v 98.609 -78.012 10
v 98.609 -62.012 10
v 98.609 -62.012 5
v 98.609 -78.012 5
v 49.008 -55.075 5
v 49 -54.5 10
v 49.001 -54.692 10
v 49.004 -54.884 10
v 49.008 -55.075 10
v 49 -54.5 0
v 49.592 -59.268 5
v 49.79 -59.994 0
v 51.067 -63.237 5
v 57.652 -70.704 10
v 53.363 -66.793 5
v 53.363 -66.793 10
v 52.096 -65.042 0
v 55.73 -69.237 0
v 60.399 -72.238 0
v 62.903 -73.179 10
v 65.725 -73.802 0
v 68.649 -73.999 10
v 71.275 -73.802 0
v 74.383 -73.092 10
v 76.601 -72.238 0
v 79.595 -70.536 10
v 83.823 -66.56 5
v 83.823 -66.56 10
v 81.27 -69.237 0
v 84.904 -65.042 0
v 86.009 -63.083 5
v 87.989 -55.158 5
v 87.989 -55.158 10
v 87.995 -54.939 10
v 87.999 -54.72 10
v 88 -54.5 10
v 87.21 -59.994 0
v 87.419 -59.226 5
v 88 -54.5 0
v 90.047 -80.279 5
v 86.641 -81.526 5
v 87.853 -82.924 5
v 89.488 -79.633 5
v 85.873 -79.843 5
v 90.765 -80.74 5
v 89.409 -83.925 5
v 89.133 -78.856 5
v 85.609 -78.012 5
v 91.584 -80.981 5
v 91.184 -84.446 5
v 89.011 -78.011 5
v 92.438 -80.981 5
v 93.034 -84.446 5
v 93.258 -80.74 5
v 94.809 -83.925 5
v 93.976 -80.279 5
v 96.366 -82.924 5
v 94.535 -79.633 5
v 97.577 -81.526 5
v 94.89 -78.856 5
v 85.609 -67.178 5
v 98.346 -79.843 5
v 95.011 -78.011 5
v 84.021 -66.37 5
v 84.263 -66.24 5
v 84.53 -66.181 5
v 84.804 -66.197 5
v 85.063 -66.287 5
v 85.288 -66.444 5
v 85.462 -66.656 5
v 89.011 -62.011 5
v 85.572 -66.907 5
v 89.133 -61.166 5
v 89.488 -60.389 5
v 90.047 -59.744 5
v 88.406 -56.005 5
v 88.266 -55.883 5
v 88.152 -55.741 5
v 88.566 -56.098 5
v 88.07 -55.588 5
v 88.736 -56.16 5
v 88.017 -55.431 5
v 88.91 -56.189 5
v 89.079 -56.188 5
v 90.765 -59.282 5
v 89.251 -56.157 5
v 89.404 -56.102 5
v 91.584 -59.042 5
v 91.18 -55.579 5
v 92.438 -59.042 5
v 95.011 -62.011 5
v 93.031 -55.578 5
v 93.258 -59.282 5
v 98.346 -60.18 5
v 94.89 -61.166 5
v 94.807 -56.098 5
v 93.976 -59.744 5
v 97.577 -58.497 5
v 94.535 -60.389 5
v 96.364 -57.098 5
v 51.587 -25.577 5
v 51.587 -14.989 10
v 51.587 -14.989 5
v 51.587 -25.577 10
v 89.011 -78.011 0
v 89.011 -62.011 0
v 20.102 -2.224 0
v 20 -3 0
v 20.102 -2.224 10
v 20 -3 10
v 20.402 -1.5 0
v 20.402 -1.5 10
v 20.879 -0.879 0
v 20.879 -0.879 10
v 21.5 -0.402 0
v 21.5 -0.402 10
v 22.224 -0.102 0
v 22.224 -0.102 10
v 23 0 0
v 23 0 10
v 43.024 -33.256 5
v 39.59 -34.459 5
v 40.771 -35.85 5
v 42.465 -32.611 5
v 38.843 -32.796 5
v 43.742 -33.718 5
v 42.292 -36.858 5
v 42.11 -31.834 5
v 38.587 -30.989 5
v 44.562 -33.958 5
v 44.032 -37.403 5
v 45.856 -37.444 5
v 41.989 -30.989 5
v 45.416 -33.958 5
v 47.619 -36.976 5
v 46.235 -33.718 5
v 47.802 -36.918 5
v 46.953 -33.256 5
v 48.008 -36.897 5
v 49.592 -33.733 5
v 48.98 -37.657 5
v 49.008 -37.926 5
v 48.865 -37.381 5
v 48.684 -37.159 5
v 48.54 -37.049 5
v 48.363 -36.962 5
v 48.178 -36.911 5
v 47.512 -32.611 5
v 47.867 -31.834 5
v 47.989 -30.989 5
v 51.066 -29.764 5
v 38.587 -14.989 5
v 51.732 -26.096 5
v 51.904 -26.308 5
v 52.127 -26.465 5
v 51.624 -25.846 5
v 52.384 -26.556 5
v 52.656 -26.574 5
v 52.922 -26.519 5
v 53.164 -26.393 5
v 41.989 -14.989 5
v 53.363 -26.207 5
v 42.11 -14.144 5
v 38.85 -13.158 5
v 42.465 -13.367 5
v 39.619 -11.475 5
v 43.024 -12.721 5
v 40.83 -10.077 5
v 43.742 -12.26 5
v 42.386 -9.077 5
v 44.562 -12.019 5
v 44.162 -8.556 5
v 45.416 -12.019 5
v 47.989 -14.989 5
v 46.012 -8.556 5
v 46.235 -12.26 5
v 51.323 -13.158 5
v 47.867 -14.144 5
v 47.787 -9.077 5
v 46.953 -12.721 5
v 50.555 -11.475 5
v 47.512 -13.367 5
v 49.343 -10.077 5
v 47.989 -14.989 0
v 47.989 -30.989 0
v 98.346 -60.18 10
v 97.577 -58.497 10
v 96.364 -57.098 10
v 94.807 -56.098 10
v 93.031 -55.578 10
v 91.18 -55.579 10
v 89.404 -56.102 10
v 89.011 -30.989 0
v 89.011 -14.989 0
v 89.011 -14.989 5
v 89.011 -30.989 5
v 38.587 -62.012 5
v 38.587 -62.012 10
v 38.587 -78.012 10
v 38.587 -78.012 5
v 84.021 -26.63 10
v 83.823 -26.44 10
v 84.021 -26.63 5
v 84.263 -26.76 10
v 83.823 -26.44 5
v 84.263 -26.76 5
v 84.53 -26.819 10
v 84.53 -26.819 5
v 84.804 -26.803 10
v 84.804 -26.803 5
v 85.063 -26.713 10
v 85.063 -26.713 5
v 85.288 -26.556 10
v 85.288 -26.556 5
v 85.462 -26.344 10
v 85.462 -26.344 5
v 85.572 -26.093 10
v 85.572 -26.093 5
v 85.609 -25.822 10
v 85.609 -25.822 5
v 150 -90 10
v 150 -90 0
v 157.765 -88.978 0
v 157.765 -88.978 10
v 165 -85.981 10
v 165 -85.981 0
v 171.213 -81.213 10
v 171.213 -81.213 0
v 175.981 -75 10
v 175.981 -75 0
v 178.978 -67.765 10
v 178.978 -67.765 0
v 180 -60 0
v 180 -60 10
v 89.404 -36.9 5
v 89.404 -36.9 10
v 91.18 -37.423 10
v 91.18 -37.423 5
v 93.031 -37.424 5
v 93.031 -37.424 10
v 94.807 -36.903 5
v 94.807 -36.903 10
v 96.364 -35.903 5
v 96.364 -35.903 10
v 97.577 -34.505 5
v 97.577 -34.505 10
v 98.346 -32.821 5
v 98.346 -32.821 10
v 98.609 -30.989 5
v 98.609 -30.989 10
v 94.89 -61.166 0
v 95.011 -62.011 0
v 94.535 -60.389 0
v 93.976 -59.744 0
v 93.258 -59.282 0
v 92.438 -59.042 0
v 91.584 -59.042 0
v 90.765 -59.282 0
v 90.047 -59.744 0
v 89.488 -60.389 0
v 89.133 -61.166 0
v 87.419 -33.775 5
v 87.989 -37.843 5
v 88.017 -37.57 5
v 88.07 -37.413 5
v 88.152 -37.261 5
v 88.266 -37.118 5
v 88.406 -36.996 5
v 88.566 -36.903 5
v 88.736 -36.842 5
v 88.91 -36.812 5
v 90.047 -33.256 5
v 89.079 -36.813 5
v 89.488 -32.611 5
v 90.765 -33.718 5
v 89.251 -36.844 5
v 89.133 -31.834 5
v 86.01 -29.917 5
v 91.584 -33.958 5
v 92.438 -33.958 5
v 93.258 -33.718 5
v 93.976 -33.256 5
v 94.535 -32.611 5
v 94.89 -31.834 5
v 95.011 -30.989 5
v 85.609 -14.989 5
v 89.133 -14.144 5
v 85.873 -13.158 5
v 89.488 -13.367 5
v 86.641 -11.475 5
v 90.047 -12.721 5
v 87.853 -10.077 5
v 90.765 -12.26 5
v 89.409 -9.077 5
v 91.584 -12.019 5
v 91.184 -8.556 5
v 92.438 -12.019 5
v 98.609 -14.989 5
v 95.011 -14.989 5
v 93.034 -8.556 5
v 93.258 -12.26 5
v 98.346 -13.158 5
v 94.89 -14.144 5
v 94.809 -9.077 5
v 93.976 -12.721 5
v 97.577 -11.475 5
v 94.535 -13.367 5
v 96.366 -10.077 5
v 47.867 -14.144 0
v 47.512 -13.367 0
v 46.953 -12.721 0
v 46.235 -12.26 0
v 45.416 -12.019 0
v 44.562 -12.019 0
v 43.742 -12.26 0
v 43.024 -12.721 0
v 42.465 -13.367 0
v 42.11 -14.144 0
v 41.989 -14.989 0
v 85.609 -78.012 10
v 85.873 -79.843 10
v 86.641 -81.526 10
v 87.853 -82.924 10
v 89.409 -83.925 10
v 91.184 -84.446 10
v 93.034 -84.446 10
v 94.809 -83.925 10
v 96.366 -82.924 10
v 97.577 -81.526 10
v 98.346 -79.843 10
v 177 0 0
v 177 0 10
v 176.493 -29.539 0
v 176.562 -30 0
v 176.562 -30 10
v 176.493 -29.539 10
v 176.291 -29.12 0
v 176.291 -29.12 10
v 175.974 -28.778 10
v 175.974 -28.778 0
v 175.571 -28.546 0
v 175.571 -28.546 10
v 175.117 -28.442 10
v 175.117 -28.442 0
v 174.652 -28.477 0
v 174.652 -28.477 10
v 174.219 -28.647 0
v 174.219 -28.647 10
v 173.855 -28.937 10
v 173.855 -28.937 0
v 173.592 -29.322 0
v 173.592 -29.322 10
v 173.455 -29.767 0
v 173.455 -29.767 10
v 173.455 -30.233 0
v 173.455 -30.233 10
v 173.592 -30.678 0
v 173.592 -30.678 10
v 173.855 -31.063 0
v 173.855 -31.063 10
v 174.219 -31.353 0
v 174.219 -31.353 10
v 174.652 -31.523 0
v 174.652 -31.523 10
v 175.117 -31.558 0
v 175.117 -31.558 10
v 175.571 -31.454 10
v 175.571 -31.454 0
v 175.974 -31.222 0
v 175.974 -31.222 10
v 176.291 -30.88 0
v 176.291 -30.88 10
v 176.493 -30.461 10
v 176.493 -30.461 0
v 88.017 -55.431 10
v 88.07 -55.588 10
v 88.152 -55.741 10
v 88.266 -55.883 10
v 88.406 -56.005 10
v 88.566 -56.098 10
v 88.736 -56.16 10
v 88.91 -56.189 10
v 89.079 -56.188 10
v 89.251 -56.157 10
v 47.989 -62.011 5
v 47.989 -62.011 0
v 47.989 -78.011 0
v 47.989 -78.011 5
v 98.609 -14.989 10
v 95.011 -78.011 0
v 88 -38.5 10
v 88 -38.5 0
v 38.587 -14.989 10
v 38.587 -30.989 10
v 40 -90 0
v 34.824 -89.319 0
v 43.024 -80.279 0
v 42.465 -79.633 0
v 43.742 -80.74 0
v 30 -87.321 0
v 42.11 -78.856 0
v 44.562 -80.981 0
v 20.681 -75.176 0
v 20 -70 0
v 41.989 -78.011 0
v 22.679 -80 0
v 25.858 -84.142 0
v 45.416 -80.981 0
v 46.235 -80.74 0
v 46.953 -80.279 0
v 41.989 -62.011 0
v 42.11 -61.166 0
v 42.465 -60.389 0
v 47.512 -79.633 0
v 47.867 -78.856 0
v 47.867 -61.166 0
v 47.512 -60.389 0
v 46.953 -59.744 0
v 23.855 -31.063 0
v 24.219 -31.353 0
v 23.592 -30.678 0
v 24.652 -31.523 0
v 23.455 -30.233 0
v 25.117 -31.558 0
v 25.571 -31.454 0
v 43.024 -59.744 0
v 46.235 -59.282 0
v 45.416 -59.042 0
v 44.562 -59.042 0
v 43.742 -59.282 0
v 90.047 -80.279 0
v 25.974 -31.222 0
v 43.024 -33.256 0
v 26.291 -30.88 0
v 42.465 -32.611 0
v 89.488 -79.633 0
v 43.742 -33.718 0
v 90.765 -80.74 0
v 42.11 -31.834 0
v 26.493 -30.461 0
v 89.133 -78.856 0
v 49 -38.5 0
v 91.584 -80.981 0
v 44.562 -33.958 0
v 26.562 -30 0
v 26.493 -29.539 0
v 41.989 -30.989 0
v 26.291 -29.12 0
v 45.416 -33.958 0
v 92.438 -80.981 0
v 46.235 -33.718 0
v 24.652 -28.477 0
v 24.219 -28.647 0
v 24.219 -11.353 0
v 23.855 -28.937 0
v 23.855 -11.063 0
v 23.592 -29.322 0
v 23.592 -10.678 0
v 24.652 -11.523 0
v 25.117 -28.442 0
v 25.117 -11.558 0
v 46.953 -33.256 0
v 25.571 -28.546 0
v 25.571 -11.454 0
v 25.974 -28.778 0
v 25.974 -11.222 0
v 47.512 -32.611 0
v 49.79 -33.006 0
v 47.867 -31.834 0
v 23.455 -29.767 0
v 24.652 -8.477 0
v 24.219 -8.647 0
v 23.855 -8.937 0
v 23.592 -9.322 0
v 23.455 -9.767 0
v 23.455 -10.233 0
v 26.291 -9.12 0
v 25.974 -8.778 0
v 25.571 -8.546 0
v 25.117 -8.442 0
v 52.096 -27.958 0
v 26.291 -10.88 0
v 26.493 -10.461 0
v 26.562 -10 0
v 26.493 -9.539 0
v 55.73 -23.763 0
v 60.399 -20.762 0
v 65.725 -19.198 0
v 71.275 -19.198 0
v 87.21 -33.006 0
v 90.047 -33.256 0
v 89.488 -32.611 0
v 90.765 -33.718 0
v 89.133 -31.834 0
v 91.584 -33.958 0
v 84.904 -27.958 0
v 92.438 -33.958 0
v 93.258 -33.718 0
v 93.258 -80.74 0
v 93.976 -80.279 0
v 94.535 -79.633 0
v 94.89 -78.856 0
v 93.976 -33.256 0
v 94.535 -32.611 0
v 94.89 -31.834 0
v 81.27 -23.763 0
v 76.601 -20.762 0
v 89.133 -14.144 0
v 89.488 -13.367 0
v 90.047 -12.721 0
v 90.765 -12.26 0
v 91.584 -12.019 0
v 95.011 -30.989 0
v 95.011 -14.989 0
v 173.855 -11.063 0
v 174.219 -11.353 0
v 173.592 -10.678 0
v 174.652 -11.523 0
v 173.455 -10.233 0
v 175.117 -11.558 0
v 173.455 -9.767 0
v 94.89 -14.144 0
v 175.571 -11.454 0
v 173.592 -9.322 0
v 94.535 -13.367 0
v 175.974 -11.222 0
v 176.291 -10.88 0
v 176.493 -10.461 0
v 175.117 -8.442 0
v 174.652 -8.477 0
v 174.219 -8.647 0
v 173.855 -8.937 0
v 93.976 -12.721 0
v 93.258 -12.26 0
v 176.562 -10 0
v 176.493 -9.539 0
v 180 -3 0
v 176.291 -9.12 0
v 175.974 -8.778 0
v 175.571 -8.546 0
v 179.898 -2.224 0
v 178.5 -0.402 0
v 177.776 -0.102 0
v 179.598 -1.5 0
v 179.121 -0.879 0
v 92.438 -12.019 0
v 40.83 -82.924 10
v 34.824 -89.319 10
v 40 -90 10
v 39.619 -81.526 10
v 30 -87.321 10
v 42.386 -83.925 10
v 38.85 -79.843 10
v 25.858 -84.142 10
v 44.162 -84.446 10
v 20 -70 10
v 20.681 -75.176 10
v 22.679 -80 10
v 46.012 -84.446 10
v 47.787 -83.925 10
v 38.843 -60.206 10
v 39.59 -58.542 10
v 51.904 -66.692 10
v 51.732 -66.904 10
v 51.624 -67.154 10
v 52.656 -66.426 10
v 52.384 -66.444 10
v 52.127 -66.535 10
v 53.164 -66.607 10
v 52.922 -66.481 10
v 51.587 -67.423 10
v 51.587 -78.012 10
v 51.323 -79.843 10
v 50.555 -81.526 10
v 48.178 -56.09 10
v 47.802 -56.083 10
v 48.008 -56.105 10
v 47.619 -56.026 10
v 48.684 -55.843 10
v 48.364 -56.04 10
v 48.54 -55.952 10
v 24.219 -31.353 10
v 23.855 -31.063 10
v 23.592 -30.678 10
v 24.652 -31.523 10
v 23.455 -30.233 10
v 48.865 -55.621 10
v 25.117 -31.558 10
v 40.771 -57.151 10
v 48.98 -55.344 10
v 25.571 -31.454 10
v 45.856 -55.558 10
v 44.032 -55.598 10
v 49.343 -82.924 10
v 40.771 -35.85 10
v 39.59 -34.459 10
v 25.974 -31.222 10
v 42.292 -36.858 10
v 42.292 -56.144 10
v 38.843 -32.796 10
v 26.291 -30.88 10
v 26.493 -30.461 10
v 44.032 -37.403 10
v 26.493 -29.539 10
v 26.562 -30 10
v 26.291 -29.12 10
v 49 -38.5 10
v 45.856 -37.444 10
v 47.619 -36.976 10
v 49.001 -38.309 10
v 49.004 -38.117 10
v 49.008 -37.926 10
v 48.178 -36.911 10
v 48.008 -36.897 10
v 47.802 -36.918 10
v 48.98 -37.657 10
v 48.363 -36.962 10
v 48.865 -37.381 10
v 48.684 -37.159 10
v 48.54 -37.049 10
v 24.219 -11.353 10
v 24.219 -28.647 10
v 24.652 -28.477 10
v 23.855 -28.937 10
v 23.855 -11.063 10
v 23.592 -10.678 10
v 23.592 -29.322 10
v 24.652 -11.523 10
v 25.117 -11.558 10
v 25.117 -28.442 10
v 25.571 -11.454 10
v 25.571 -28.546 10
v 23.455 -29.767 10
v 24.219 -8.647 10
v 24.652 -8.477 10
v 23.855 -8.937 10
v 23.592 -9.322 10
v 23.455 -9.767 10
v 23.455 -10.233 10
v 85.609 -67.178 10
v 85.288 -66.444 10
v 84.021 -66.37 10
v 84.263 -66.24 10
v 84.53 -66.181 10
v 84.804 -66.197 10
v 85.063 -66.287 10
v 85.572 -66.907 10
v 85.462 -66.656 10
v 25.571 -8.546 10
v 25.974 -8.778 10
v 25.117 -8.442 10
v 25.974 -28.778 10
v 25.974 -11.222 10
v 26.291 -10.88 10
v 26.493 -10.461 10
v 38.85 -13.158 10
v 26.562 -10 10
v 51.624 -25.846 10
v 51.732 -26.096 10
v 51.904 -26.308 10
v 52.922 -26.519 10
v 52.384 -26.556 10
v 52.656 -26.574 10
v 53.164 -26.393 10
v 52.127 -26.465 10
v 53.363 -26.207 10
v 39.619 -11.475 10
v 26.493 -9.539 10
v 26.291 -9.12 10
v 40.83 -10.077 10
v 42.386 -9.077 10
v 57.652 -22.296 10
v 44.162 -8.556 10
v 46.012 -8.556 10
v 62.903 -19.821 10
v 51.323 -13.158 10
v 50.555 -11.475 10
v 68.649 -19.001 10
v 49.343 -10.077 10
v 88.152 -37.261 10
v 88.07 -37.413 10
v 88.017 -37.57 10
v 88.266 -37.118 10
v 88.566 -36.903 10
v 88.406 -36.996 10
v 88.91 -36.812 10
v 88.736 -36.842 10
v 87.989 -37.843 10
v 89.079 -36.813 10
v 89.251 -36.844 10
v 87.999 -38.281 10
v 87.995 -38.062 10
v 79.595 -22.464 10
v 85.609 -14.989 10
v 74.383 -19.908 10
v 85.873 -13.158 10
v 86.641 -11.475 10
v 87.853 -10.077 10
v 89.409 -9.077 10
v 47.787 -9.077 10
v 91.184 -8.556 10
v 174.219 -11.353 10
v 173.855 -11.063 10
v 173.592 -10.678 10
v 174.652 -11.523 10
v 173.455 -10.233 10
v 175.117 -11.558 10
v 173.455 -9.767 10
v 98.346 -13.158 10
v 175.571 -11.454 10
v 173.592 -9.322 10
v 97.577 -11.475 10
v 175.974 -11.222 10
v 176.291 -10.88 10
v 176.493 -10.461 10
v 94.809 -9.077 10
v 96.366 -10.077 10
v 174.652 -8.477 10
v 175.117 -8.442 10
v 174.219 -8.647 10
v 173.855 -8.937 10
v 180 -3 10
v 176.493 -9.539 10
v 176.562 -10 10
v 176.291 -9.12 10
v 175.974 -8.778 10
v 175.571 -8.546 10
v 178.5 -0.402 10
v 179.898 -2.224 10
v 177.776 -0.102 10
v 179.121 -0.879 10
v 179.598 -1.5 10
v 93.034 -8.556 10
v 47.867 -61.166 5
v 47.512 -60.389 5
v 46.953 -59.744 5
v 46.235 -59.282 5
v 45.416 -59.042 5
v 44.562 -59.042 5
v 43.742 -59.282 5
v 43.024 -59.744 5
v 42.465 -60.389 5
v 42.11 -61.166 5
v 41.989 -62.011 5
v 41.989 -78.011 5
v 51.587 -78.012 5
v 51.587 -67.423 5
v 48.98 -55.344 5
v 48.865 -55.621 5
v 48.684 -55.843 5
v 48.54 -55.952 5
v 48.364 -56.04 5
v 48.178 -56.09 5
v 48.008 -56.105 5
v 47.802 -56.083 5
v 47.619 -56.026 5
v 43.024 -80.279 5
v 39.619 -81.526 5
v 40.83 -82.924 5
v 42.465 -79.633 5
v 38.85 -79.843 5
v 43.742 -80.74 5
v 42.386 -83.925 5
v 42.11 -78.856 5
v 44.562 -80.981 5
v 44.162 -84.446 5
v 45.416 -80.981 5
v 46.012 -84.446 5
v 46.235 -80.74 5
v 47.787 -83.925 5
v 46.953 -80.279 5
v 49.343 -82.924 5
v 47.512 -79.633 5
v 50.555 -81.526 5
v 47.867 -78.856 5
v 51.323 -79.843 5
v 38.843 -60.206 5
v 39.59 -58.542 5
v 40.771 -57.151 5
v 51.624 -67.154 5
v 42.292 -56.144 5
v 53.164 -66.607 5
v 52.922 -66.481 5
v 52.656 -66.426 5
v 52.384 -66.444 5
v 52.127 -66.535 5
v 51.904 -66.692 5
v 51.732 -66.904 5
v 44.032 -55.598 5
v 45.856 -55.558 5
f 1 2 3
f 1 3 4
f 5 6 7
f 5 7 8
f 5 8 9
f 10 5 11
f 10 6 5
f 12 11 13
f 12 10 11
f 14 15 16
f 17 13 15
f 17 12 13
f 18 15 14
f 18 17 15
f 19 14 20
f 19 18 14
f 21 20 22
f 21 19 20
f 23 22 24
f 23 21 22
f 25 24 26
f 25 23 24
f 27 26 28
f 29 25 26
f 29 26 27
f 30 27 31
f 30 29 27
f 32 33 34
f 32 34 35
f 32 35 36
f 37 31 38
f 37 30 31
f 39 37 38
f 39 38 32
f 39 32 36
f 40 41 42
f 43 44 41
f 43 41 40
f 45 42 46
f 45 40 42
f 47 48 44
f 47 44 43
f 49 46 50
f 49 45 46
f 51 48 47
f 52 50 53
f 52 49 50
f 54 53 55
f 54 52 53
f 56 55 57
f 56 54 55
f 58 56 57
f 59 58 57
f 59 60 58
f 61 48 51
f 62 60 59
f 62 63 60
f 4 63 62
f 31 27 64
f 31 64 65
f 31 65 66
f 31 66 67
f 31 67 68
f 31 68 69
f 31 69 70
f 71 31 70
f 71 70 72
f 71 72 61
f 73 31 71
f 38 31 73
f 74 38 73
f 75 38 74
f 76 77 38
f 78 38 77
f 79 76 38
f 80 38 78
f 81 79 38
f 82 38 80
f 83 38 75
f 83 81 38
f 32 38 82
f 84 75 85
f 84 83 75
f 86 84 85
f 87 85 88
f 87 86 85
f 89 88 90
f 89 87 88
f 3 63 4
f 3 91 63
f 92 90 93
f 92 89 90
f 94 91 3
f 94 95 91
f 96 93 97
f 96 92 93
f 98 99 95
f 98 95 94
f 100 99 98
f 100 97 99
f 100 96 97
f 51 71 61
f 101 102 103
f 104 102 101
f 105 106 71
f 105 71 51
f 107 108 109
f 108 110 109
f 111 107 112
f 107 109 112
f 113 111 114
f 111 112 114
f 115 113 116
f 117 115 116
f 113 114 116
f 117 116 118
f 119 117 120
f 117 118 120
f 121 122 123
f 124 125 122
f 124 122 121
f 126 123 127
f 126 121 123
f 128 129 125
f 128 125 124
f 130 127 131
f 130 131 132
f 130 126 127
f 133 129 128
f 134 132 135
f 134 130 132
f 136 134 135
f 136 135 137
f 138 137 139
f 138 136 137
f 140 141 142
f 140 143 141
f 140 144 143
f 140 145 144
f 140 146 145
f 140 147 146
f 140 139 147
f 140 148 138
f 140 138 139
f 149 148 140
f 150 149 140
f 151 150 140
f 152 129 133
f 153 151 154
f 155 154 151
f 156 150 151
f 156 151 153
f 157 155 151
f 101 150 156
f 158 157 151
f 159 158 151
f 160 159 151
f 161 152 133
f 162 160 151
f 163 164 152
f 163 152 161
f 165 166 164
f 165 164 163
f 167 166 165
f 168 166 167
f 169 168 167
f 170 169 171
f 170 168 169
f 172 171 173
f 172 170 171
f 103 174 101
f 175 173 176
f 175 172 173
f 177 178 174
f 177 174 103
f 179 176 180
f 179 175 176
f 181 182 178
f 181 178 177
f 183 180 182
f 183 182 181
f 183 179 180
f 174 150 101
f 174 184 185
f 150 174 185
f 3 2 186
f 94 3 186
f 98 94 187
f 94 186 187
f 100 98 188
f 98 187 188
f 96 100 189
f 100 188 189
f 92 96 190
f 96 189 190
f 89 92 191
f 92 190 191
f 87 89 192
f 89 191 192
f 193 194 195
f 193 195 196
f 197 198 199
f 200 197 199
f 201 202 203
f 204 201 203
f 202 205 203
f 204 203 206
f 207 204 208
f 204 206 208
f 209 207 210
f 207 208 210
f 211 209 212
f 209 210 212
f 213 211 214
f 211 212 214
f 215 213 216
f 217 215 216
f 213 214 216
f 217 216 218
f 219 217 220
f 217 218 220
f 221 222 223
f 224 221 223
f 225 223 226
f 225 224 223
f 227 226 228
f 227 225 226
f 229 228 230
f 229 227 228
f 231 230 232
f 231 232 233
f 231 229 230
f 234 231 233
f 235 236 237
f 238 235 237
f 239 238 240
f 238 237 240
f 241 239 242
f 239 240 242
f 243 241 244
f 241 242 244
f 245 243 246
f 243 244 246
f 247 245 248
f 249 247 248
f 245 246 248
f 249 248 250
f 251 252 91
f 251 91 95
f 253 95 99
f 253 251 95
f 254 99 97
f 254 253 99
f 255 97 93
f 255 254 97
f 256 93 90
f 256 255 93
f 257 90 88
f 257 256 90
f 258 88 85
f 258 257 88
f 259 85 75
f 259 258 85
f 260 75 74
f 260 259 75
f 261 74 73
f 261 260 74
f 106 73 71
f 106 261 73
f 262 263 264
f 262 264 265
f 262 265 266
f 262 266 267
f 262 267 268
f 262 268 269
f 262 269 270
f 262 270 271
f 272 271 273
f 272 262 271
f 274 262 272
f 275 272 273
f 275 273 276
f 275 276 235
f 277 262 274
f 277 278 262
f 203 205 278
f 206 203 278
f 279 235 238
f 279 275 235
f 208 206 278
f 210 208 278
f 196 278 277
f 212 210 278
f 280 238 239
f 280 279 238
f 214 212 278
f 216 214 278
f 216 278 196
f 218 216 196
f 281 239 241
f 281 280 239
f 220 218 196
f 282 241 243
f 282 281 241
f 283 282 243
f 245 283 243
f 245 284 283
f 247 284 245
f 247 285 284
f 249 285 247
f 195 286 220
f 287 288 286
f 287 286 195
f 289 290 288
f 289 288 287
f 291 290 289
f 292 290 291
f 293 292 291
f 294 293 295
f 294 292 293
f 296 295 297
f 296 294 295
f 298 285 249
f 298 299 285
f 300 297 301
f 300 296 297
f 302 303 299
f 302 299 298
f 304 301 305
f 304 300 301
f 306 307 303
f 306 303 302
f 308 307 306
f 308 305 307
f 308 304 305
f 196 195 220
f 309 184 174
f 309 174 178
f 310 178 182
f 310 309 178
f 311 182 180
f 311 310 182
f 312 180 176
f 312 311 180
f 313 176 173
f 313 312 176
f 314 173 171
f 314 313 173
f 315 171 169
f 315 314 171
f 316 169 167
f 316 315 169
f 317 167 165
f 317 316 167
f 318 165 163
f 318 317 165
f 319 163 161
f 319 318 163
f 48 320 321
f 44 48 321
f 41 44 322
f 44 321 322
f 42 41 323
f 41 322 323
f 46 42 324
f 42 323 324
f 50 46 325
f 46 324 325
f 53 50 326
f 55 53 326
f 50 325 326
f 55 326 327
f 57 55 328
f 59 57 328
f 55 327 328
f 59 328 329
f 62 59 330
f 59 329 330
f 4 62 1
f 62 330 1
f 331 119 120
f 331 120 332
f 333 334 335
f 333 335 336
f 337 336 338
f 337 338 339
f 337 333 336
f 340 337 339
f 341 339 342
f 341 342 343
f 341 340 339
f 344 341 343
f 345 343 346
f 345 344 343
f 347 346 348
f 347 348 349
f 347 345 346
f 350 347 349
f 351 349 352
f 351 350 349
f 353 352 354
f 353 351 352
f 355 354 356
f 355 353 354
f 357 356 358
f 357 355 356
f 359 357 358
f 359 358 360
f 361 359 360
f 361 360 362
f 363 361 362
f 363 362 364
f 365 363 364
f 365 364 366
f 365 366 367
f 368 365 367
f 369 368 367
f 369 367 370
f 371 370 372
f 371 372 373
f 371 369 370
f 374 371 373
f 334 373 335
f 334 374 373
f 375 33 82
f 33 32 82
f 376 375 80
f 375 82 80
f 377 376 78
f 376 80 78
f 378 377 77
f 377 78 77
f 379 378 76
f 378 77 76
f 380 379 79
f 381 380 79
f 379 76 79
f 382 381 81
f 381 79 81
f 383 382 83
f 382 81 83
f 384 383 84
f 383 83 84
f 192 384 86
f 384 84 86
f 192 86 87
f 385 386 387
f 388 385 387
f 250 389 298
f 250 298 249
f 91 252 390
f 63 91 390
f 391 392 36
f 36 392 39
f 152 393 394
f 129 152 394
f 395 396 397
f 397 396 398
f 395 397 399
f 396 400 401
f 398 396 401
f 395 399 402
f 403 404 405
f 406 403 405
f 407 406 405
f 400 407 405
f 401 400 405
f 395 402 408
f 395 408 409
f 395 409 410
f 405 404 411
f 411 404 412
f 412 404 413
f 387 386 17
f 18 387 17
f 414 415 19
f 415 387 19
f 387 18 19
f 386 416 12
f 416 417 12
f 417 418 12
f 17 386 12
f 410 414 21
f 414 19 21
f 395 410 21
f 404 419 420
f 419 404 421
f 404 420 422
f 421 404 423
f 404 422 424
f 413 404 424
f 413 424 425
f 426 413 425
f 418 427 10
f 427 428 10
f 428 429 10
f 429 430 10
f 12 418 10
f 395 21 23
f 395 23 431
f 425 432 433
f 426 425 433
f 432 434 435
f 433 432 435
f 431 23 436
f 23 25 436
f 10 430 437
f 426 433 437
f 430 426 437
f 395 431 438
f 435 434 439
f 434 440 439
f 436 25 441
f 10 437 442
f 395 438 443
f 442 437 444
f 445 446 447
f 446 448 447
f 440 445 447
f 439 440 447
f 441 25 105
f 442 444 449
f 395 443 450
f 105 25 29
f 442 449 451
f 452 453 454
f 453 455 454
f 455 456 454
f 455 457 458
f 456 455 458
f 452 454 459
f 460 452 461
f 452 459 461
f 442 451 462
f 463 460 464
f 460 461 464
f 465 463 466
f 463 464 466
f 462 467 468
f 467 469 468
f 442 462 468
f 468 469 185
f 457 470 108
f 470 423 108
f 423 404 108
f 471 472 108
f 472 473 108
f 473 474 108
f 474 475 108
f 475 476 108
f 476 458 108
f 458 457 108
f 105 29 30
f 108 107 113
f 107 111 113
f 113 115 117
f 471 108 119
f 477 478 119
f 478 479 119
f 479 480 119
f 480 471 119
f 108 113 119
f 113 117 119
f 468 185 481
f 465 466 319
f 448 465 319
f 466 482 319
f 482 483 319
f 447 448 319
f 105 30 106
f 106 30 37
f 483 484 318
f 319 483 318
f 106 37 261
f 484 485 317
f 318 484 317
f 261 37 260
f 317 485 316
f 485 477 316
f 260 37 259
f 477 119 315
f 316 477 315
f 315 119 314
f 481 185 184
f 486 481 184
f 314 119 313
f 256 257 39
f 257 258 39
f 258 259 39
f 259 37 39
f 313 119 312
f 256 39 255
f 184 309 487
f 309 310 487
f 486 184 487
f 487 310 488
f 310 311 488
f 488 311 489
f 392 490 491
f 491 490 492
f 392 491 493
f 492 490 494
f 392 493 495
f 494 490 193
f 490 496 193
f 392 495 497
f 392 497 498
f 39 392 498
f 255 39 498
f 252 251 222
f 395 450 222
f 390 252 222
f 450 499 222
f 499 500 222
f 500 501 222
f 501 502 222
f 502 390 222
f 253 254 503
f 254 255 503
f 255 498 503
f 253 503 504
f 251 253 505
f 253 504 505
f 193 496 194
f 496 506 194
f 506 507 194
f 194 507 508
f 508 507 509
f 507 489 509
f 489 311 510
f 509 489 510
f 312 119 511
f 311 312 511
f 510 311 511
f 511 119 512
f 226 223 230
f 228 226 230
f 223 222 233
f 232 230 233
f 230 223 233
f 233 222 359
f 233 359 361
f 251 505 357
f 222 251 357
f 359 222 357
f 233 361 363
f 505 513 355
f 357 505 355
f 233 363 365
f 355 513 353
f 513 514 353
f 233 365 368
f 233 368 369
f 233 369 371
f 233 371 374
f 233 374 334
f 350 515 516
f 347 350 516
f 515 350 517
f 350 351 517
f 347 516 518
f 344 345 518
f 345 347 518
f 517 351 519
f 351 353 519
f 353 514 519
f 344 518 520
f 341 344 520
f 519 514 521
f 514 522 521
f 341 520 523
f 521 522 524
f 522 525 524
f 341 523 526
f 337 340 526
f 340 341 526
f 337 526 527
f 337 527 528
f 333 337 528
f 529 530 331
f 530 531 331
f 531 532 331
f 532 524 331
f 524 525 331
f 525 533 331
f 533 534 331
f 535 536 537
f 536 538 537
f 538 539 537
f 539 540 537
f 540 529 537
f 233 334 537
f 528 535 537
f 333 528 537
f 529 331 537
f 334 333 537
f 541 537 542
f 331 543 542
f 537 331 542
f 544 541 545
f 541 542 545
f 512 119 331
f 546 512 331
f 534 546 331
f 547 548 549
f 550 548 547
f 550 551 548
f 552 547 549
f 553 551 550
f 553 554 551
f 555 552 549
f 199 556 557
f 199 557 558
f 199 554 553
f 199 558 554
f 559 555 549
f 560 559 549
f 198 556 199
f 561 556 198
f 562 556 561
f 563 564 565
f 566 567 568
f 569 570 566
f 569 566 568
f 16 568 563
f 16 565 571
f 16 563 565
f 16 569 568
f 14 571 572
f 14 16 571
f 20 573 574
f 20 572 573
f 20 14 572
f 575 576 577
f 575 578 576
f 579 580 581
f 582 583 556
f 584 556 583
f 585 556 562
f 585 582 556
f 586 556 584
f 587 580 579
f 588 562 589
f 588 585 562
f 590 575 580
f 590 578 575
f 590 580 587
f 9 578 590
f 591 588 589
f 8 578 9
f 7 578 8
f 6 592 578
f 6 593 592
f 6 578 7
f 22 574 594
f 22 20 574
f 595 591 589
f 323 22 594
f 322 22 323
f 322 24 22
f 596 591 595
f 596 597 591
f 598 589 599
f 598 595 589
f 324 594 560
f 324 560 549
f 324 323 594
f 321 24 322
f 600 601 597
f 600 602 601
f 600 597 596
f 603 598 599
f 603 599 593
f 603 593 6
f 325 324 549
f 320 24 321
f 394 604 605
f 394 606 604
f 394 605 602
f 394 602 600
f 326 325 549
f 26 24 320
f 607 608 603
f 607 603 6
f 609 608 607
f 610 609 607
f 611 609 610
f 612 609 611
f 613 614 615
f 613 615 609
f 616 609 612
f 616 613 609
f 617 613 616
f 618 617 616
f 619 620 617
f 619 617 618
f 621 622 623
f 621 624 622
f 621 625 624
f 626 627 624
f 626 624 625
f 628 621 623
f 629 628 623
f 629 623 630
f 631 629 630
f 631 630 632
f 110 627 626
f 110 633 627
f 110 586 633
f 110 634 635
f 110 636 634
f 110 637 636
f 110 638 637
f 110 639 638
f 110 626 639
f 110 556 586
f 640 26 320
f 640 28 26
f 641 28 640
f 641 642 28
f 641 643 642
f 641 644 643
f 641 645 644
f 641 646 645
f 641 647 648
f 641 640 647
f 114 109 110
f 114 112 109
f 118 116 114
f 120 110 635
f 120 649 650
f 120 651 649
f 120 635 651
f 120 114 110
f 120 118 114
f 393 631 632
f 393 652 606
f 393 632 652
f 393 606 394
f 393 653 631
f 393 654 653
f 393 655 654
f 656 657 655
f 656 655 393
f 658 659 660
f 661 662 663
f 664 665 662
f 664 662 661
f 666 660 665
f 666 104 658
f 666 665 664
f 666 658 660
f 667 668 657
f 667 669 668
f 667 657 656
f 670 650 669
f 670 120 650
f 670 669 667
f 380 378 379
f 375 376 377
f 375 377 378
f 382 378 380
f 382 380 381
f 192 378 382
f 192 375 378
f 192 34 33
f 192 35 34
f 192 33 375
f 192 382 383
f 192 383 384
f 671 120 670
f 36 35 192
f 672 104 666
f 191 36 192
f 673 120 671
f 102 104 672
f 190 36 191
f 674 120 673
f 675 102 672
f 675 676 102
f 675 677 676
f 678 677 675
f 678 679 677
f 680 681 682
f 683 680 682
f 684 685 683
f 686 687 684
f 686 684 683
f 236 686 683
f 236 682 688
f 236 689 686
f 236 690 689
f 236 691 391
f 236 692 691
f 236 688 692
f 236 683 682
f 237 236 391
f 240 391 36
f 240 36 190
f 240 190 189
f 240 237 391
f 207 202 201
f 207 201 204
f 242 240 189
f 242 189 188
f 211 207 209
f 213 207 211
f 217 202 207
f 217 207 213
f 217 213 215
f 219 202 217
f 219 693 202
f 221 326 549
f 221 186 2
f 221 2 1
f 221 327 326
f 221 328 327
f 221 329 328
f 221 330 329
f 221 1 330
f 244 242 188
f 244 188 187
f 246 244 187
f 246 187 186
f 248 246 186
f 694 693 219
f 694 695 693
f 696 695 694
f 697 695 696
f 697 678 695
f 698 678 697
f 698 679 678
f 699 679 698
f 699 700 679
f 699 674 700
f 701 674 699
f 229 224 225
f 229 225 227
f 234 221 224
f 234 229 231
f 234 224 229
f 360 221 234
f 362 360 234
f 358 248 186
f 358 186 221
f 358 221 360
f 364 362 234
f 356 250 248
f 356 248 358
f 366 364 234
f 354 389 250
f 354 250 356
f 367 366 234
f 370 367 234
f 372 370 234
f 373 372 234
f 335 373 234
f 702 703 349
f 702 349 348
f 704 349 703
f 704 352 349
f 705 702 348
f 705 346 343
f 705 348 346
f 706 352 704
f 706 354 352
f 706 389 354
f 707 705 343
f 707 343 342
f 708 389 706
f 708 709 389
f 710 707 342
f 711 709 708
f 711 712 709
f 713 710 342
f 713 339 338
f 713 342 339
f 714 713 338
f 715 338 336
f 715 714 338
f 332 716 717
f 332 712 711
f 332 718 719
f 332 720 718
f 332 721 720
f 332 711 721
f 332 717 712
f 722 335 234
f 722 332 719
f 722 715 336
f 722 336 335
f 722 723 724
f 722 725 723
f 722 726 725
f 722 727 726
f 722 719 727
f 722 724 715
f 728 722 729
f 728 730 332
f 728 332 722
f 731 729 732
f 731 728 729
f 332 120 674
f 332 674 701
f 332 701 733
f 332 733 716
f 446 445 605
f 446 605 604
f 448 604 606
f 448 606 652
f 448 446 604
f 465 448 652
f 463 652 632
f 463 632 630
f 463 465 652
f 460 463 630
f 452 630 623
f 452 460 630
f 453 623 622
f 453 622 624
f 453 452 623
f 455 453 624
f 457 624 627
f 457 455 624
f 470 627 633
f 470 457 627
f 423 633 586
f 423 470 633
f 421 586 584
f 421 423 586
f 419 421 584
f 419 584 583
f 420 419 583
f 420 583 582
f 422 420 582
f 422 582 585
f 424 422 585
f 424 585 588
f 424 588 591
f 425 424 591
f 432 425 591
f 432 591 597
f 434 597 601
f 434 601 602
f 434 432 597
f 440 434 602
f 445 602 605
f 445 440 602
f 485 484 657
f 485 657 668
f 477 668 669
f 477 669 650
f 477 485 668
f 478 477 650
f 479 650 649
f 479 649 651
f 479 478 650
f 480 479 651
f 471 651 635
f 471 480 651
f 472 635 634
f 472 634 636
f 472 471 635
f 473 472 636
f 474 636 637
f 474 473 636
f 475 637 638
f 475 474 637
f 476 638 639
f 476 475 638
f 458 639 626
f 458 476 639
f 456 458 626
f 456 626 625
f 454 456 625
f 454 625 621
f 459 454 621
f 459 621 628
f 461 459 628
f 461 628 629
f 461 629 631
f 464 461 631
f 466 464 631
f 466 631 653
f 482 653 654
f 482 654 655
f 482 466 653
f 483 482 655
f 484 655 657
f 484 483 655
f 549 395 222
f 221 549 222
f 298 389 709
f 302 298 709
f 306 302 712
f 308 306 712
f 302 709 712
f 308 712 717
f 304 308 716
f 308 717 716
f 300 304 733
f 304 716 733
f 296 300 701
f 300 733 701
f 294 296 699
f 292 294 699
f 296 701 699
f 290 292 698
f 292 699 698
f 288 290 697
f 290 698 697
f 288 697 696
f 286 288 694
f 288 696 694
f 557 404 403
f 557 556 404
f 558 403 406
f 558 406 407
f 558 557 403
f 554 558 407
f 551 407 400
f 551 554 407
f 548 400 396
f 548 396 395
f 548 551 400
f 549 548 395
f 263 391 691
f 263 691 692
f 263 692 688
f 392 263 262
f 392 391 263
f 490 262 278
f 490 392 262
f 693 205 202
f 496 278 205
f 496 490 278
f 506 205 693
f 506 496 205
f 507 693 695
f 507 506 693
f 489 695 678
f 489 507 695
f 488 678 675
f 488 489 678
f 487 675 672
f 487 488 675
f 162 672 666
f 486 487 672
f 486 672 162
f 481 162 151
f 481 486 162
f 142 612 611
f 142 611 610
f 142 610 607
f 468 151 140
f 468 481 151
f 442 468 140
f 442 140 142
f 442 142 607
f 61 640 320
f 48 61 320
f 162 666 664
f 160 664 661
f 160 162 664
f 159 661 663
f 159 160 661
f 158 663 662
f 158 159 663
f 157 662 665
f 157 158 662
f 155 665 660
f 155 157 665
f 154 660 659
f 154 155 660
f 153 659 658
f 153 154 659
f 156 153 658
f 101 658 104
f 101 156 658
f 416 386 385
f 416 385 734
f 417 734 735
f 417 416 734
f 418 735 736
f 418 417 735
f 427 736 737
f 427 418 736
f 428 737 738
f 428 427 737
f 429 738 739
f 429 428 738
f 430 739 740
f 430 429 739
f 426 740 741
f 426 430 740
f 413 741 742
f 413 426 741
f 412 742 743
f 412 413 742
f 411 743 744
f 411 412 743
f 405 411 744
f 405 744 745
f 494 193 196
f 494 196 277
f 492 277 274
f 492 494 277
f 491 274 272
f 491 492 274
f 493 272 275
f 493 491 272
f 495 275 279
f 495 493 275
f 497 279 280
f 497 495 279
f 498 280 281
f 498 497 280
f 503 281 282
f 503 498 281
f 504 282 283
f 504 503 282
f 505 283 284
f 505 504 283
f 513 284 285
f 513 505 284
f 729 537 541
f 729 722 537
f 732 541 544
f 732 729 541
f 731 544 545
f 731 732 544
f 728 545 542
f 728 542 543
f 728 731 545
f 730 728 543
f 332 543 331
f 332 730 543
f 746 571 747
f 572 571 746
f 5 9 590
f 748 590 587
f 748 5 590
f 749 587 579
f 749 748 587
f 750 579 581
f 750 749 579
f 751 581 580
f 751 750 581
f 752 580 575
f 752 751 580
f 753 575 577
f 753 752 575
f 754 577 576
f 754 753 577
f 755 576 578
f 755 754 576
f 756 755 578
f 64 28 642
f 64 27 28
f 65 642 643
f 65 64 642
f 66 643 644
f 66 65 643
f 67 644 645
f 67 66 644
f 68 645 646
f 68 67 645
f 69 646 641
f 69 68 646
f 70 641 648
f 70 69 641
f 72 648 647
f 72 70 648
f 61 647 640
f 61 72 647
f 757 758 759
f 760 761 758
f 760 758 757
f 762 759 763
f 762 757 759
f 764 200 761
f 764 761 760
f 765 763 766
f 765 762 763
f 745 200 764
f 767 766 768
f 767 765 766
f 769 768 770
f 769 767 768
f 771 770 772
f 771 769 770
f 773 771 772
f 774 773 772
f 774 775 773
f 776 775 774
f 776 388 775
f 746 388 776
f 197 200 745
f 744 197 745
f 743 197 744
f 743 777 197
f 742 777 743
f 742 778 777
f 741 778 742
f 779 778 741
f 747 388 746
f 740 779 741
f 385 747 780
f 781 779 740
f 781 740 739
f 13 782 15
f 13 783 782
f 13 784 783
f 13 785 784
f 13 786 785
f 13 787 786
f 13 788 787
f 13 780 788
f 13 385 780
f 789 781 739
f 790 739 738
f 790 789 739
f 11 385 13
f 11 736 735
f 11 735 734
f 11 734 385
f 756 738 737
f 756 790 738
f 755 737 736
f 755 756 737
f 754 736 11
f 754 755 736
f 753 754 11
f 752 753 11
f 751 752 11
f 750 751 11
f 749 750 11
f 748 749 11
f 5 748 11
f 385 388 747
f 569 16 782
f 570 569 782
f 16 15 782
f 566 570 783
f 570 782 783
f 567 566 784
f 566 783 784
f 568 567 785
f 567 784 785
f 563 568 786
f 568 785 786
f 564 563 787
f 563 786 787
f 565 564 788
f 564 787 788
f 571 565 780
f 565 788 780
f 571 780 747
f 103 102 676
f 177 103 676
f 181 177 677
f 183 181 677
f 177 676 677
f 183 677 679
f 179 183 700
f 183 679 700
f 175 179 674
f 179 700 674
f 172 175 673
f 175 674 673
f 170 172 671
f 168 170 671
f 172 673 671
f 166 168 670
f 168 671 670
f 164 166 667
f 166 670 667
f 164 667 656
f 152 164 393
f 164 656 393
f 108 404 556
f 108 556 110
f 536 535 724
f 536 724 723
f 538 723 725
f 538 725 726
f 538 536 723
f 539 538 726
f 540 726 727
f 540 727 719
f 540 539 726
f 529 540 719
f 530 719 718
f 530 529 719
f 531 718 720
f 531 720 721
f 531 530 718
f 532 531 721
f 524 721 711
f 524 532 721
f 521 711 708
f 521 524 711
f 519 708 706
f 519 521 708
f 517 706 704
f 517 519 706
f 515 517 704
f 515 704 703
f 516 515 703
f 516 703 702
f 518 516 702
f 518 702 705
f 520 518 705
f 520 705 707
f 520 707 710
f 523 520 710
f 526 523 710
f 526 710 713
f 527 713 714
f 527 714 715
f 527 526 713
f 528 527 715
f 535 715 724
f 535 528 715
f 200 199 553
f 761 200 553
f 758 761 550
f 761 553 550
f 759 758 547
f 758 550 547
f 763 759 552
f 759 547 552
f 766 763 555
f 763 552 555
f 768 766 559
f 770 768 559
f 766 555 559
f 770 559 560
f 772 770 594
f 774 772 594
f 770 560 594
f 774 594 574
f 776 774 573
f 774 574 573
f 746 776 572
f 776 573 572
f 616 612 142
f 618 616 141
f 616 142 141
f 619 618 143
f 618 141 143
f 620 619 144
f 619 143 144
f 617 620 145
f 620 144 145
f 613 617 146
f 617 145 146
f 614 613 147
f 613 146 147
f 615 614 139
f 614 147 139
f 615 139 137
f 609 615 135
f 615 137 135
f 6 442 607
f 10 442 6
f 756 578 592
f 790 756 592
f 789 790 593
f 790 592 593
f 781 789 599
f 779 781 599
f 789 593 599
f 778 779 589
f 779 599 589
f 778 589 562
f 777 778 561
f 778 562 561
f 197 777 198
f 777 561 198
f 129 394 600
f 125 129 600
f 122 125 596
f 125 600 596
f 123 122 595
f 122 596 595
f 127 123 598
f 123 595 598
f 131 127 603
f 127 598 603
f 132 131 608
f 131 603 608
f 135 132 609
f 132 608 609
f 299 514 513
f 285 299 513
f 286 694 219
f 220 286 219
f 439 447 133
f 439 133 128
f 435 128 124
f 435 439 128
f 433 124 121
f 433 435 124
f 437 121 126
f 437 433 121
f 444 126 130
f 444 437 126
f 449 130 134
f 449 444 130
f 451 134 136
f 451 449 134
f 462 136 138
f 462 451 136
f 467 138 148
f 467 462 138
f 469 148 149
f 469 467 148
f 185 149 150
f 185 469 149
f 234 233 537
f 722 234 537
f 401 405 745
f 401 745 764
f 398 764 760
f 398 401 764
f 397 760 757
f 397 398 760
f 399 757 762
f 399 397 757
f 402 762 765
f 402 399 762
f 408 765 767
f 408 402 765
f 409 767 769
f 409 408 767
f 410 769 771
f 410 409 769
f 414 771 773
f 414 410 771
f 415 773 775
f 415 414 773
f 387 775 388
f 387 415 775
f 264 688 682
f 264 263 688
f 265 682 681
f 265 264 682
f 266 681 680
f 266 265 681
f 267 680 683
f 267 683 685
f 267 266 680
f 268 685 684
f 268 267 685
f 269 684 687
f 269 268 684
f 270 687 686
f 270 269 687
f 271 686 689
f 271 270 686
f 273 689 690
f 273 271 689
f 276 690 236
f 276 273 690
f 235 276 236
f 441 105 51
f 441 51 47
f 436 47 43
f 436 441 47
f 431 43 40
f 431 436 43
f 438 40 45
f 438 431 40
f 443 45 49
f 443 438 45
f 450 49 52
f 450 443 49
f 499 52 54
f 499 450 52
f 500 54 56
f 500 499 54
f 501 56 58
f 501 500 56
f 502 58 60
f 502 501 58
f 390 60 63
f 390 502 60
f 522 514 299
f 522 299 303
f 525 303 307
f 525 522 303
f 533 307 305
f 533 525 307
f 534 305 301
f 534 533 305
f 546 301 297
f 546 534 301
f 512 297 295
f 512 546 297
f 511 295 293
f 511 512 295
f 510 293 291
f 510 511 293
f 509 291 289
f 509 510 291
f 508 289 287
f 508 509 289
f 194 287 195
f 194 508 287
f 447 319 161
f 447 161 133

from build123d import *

# Parameters (mm, degrees)
SKETCH_W     = 160
SKETCH_H     = 90
SKETCH_R     = 1.5625
PAD_DEPTH    = 10
POCKET_DEPTH = 5
FILLET_R     = 20
FILLET001_R  = 30
FILLET002_R  = 3
FILLET003_R  = 1
FILLET004_R  = 1
FILLET005_R  = 1


with BuildPart() as part:
    # Sketch → Pad (new body)
    with BuildSketch(Plane.XY):
        with Locations((100, -45)):
            Rectangle(SKETCH_W, SKETCH_H)
        with Locations((175, -10)):
            Circle(SKETCH_R, mode=Mode.SUBTRACT)
        with Locations((175, -30)):
            Circle(SKETCH_R, mode=Mode.SUBTRACT)
        with Locations((25, -10)):
            Circle(SKETCH_R, mode=Mode.SUBTRACT)
        with Locations((25, -30)):
            Circle(SKETCH_R, mode=Mode.SUBTRACT)
        with BuildLine():
            ThreePointArc((95.0113, -14.9887), (92.0113, -11.9887), (89.0113, -14.9887))
            Line((89.0113, -14.9887), (89.0113, -30.9887))
            ThreePointArc((89.0113, -30.9887), (92.0113, -33.9887), (95.0113, -30.9887))
            Line((95.0113, -14.9887), (95.0113, -30.9887))
        make_face(mode=Mode.SUBTRACT)
        with BuildLine():
            ThreePointArc((88, -38.5), (68.5, -19), (49, -38.5))
            Line((49, -38.5), (49, -54.5))
            ThreePointArc((49, -54.5), (68.5, -74), (88, -54.5))
            Line((88, -38.5), (88, -54.5))
        make_face(mode=Mode.SUBTRACT)
        with BuildLine():
            ThreePointArc((95.0113, -62.0113), (92.0113, -59.0113), (89.0113, -62.0113))
            Line((89.0113, -62.0113), (89.0113, -78.0113))
            ThreePointArc((89.0113, -78.0113), (92.0113, -81.0113), (95.0113, -78.0113))
            Line((95.0113, -62.0113), (95.0113, -78.0113))
        make_face(mode=Mode.SUBTRACT)
        with BuildLine():
            ThreePointArc((47.9887, -62.0113), (44.9887, -59.0113), (41.9887, -62.0113))
            Line((41.9887, -62.0113), (41.9887, -78.0113))
            ThreePointArc((41.9887, -78.0113), (44.9887, -81.0113), (47.9887, -78.0113))
            Line((47.9887, -62.0113), (47.9887, -78.0113))
        make_face(mode=Mode.SUBTRACT)
        with BuildLine():
            ThreePointArc((47.9887, -14.9887), (44.9887, -11.9887), (41.9887, -14.9887))
            Line((41.9887, -14.9887), (41.9887, -30.9887))
            ThreePointArc((41.9887, -30.9887), (44.9887, -33.9887), (47.9887, -30.9887))
            Line((47.9887, -14.9887), (47.9887, -30.9887))
        make_face(mode=Mode.SUBTRACT)
    extrude(amount=PAD_DEPTH)

    # Sketch001 (on Face30 of Pad) → Pocket (cut)
    with BuildSketch(Plane.XY.offset(10)):
        with BuildLine():
            ThreePointArc((98.609297, -14.98945), (92.109297, -8.48945), (85.609297, -14.98945))
            Line((85.609297, -14.98945), (85.609297, -30.98945))
            ThreePointArc((85.609297, -30.98945), (92.109297, -37.48945), (98.609297, -30.98945))
            Line((98.609297, -14.98945), (98.609297, -30.98945))
        make_face()
        with BuildLine():
            ThreePointArc((51.586696, -14.98945), (45.086696, -8.48945), (38.586696, -14.98945))
            Line((38.586696, -14.98945), (38.586696, -30.98945))
            ThreePointArc((38.586696, -30.98945), (45.086696, -37.48945), (51.586696, -30.98945))
            Line((51.586696, -14.98945), (51.586696, -30.98945))
        make_face()
        with BuildLine():
            ThreePointArc((98.609297, -62.012051), (92.109297, -55.512051), (85.609297, -62.012051))
            Line((85.609297, -62.012051), (85.609297, -78.012051))
            ThreePointArc((85.609297, -78.012051), (92.109297, -84.512051), (98.609297, -78.012051))
            Line((98.609297, -62.012051), (98.609297, -78.012051))
        make_face()
        with BuildLine():
            ThreePointArc((51.586696, -62.012051), (45.086696, -55.512051), (38.586696, -62.012051))
            Line((38.586696, -62.012051), (38.586696, -78.012051))
            ThreePointArc((38.586696, -78.012051), (45.086696, -84.512051), (51.586696, -78.012051))
            Line((51.586696, -62.012051), (51.586696, -78.012051))
        make_face()
    extrude(amount=-POCKET_DEPTH, mode=Mode.SUBTRACT)

    # Fillet
    fillet_edges = [part.edges().sort_by_distance(p)[0] for p in [
        (20, -90, 5),
    ]]
    fillet(fillet_edges, radius=FILLET_R)

    # Fillet001
    fillet001_edges = [part.edges().sort_by_distance(p)[0] for p in [
        (180, -90, 5),
    ]]
    fillet(fillet001_edges, radius=FILLET001_R)

    # Fillet002
    fillet002_edges = [part.edges().sort_by_distance(p)[0] for p in [
        (20, 0, 5),
        (180, 0, 5),
    ]]
    fillet(fillet002_edges, radius=FILLET002_R)

    # Fillet003
    fillet003_edges = [part.edges().sort_by_distance(p)[0] for p in [
        (87.822355, -57.126141, 7.5),
    ]]
    fillet(fillet003_edges, radius=FILLET003_R)

    # Fillet004
    fillet004_edges = [part.edges().sort_by_distance(p)[0] for p in [
        (85.609297, -29.144684, 7.5),
        (51.586696, -28.794838, 7.5),
        (49.153433, -56.941385, 7.5),
    ]]
    fillet(fillet004_edges, radius=FILLET004_R)

    # Fillet005
    fillet005_edges = [part.edges().sort_by_distance(p)[0] for p in [
        (85.609297, -63.855316, 7.5),
        (51.586696, -64.205162, 7.5),
        (49.153223, -36.060285, 7.5),
        (87.822586, -35.875564, 7.5),
    ]]
    fillet(fillet005_edges, radius=FILLET005_R)


solid = part.part
